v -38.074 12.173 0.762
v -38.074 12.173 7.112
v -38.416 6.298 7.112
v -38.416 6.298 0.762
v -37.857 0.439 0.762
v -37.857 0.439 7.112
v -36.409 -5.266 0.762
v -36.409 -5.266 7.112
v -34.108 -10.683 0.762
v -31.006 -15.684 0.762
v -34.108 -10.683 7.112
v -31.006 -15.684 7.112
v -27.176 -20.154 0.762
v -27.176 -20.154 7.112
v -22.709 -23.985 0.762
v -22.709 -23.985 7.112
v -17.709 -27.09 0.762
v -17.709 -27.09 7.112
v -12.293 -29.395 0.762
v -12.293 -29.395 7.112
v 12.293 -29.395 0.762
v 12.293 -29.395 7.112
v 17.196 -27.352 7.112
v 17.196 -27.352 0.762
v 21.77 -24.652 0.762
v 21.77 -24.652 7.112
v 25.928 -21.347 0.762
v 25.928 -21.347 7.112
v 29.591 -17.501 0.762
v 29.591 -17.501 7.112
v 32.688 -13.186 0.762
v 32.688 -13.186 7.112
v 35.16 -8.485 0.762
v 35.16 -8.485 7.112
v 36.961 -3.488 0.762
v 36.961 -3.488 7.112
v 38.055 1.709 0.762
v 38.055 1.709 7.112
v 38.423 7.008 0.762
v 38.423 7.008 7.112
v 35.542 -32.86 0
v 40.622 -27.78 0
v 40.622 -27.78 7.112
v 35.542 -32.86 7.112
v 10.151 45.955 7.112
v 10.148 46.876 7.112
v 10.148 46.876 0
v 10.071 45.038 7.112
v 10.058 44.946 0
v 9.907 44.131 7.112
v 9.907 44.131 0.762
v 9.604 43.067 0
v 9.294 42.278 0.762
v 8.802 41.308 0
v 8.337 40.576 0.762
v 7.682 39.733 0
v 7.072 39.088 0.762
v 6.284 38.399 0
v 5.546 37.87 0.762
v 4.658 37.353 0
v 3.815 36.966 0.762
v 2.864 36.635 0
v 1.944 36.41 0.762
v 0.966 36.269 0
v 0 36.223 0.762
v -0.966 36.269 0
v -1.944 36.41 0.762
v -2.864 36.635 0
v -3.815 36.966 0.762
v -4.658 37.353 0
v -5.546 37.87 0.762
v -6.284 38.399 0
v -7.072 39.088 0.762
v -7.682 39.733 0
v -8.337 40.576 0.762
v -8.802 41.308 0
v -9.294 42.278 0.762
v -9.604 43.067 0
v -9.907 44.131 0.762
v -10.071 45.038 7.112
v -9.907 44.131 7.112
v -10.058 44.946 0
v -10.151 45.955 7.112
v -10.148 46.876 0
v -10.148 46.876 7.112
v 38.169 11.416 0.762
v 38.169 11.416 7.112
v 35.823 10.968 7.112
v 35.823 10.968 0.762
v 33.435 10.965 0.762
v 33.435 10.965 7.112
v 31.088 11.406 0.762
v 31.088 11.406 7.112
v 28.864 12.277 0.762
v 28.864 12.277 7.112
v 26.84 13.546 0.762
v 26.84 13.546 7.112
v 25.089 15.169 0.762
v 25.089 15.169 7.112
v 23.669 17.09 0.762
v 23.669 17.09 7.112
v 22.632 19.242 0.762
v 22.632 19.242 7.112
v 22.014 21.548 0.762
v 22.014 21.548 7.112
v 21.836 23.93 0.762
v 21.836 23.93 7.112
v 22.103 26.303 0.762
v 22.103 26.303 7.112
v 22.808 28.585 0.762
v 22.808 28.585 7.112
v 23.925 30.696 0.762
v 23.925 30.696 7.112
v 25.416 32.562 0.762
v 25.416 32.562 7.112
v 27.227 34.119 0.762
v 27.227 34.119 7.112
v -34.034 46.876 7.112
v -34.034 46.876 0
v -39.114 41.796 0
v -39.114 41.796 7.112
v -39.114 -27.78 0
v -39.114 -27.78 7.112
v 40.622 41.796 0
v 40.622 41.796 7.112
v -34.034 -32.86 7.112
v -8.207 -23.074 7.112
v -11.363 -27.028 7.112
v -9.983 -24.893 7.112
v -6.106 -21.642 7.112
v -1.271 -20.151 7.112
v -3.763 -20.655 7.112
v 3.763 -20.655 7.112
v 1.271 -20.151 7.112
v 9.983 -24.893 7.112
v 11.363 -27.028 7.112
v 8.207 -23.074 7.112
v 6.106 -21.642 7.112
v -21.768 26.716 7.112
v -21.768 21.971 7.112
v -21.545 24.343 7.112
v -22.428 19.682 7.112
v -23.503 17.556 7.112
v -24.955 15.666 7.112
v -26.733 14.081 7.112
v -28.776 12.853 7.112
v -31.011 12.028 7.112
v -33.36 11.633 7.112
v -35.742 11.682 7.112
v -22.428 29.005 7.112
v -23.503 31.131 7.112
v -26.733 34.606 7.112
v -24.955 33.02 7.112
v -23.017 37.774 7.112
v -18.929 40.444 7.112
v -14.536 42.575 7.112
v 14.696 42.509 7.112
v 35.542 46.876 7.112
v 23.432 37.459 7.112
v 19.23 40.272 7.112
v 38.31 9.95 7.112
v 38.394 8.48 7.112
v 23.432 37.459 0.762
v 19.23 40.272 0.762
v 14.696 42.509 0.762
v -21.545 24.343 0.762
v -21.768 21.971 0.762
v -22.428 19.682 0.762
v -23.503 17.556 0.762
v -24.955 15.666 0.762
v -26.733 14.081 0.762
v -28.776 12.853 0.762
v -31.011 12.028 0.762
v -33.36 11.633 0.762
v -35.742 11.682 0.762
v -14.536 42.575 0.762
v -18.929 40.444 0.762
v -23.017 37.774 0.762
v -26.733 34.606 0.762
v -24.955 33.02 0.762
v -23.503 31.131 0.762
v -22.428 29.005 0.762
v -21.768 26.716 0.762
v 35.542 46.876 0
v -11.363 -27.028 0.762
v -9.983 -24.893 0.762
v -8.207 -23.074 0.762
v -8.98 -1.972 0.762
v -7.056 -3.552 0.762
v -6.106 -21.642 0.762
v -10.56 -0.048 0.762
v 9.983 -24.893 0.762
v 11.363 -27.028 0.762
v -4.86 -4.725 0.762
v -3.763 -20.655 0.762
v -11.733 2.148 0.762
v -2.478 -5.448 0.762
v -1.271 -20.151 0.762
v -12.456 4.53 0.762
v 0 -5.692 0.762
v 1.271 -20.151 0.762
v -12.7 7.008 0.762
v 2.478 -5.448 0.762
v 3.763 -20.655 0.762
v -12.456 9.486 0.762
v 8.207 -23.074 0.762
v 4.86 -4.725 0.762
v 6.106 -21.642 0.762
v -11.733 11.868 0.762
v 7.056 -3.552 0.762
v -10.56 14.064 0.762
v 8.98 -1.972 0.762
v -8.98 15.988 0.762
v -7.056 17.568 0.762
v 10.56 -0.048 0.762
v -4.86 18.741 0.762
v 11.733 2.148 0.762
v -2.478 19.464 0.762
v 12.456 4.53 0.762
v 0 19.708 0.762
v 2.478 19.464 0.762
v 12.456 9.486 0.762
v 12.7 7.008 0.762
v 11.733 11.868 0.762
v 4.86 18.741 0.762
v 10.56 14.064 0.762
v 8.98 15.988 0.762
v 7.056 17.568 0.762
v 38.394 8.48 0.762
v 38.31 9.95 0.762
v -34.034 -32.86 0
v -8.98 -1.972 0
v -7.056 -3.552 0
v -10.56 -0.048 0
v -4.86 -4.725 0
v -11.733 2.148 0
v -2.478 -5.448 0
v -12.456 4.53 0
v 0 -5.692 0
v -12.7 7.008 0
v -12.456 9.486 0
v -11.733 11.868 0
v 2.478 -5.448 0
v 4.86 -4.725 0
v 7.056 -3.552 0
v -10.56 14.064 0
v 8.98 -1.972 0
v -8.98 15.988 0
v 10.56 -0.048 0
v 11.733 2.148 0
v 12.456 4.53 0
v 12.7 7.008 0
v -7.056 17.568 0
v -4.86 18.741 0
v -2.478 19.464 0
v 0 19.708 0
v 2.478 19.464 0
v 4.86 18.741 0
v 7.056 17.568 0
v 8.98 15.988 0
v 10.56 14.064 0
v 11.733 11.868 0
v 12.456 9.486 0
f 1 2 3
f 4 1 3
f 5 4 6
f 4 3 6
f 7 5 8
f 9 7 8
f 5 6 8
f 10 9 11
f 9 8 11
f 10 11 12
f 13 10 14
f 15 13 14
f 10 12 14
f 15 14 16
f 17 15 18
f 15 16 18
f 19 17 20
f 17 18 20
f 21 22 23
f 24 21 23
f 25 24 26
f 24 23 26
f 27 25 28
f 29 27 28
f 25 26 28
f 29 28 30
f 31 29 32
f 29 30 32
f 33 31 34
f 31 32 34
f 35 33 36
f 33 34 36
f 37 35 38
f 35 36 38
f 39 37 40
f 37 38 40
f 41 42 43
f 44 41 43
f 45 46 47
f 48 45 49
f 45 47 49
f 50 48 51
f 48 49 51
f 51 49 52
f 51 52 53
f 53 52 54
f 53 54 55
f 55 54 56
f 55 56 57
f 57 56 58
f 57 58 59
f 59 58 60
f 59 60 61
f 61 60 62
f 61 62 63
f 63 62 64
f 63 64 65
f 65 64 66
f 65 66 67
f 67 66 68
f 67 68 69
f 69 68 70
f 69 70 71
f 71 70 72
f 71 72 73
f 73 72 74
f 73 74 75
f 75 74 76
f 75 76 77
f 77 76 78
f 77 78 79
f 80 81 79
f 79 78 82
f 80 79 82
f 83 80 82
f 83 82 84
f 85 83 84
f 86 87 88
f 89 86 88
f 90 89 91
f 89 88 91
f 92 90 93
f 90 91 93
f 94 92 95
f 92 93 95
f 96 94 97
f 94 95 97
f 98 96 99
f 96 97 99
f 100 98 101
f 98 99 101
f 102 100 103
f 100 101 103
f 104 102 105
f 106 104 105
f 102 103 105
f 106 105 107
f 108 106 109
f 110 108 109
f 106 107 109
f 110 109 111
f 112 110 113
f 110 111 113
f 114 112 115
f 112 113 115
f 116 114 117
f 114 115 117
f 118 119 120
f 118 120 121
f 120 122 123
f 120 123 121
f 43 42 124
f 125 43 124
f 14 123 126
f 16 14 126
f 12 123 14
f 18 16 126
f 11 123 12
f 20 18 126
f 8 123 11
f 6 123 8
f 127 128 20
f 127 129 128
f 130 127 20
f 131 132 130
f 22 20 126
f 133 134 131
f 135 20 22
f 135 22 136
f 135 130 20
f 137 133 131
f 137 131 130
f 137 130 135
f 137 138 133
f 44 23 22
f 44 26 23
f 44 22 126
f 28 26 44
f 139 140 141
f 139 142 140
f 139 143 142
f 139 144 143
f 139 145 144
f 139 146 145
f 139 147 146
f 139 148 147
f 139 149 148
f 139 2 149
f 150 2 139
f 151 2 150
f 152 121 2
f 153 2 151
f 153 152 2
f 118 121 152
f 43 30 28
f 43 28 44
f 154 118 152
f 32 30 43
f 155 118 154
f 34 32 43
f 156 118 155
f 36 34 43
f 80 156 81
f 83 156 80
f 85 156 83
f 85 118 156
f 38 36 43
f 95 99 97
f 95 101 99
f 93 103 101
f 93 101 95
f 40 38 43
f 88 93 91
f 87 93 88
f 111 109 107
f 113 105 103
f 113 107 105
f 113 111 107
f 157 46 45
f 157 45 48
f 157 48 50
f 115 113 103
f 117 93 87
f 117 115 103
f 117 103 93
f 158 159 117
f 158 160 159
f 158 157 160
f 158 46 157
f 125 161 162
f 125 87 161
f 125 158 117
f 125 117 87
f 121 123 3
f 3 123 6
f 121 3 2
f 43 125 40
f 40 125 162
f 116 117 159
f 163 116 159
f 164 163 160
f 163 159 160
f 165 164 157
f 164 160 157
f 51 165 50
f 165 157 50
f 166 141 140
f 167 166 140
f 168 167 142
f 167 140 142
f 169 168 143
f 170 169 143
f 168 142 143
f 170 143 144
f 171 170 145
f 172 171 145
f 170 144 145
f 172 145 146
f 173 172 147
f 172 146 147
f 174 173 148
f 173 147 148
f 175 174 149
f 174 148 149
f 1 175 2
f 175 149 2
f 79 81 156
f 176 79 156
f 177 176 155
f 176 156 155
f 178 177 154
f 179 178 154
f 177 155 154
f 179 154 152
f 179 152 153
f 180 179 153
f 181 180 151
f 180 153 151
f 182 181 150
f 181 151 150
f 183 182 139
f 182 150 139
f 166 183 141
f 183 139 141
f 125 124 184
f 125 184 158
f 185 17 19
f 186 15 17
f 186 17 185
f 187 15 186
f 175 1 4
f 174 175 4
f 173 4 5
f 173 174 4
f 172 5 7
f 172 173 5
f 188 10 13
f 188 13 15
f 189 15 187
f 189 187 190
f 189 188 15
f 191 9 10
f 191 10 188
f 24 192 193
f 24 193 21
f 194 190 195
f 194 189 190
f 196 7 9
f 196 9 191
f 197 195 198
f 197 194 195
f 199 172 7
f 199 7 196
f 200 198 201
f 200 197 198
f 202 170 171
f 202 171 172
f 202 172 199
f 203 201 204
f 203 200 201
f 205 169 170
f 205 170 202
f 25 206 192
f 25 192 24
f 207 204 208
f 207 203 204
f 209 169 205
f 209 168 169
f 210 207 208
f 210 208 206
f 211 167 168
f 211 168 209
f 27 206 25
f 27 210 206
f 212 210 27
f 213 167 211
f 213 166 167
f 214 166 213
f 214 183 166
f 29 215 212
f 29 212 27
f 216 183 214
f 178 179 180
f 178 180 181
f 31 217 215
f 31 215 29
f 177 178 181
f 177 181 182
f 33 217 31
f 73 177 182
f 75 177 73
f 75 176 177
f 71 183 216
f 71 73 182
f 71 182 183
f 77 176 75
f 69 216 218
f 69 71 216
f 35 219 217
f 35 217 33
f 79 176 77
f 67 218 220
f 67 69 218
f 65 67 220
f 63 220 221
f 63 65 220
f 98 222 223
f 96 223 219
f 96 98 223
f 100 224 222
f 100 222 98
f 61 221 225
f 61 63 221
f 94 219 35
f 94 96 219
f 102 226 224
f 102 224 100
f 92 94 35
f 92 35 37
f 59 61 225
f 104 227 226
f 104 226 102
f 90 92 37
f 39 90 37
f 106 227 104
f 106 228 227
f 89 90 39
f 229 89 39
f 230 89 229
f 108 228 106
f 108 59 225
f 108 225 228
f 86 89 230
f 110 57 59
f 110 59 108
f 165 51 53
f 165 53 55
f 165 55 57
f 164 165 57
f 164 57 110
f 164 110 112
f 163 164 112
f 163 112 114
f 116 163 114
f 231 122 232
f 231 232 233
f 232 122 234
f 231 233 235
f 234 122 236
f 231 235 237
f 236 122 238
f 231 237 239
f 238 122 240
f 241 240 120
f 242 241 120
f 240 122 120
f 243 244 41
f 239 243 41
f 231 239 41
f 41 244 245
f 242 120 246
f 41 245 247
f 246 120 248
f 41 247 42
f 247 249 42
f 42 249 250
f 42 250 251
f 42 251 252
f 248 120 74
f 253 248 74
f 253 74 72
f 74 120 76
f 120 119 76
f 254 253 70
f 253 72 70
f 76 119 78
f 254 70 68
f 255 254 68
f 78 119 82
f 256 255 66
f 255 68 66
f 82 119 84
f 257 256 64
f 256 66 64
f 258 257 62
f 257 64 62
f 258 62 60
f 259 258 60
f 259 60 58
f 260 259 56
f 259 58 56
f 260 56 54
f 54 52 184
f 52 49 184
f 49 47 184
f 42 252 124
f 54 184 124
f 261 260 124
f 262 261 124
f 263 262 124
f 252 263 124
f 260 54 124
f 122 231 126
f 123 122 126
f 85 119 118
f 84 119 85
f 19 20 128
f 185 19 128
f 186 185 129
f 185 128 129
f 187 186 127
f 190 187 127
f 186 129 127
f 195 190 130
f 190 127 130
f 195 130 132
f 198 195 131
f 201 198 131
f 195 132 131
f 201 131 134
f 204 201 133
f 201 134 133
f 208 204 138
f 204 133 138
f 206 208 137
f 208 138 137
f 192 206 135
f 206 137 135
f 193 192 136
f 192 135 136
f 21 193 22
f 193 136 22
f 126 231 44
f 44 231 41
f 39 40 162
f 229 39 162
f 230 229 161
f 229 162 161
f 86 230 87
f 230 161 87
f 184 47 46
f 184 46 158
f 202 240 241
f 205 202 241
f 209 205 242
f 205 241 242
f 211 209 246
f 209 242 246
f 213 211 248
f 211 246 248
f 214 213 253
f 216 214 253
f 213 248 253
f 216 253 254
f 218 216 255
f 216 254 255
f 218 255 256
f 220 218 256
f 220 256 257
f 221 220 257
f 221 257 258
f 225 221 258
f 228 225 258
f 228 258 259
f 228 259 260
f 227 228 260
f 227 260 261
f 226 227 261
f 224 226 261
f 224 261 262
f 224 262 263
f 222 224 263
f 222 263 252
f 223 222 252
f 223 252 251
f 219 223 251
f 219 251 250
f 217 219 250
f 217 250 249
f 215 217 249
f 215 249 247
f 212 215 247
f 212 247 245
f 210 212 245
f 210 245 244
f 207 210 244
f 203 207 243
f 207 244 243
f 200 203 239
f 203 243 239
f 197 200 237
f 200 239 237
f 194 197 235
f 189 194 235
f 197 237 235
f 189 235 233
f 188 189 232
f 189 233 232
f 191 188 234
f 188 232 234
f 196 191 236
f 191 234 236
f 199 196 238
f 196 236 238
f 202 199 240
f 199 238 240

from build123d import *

# Parameters (mm, degrees)
F0_W     = 79.736687
F0_H     = 79.736683
F1_DEPTH = 7.112
F3_DEPTH = 6.35
F4_SIZE  = 5.08
F6_D     = 25.4
F8_D     = 20.32
F5_R     = 12.951628
F9_DEPTH = 4.572


with BuildPart() as f1:
    # F0 (on Top) → F1 (new body)
    with BuildSketch(Plane.XY):
        with Locations((0.753854, 7.008081)):
            Rectangle(F0_W, F0_H)
    extrude(amount=F1_DEPTH)

    # F2 (on face) → F3 (cut)
    with BuildSketch(Plane.XY.offset(7.112)):
        with BuildLine():
            ThreePointArc((12.293341, -29.39476), (31.214057, -15.396734), (38.42256, 7.008081))
            ThreePointArc((38.42256, 7.008081), (38.359097, 9.215515), (38.168919, 11.415657))
            ThreePointArc((38.168919, 11.415657), (23.100575, 18.141586), (27.227051, 34.118611))
            ThreePointArc((27.227051, 34.118611), (0.347081, 45.429074), (-26.732835, 34.606064))
            ThreePointArc((-26.732835, 34.606064), (-22.915627, 30.093116), (-21.544947, 24.343419))
            ThreePointArc((-21.544947, 24.343419), (-26.733198, 14.080507), (-38.073768, 12.173477))
            ThreePointArc((-38.073768, 12.173477), (-32.65258, -13.242897), (-12.293341, -29.39476))
            ThreePointArc((-12.293341, -29.39476), (0, -20.087793), (12.293341, -29.39476))
        make_face()
    extrude(amount=-F3_DEPTH, mode=Mode.SUBTRACT)

    # F4
    f4_edges = [f1.edges().sort_by_distance(p)[0] for p in [
        (40.622197, 46.876423, 3.556),
        (-39.11449, 46.876423, 3.556),
        (40.622197, -32.86026, 3.556),
        (-39.11449, -32.86026, 3.556),
    ]]
    chamfer(f4_edges, length=F4_SIZE)

    # F6 (through all)
    with Locations(Plane.XY.offset(7.112)):
        with Locations((0, 7.008081)):
            Hole(F6_D / 2)

    # F8 (through all)
    with Locations(Plane.XY.offset(7.112)):
        with Locations((0, 46.382606)):
            Hole(F8_D / 2)

    # F5 (on face) + F0 (on Top) → F9 (cut)
    with BuildSketch(Plane.XY.offset(7.112)):
        with BuildLine():
            ThreePointArc((-12.293341, -29.39476), (0, -20.087793), (12.293341, -29.39476))
            ThreePointArc((12.293341, -29.39476), (31.214057, -15.396734), (38.42256, 7.008081))
            ThreePointArc((38.42256, 7.008081), (38.359097, 9.215515), (38.168919, 11.415657))
            ThreePointArc((38.168919, 11.415657), (23.100575, 18.141586), (27.227051, 34.118611))
            ThreePointArc((27.227051, 34.118611), (0.347081, 45.429074), (-26.732835, 34.606064))
            ThreePointArc((-26.732835, 34.606064), (-22.915627, 30.093116), (-21.544947, 24.343419))
            ThreePointArc((-21.544947, 24.343419), (-26.733198, 14.080507), (-38.073768, 12.173477))
            ThreePointArc((-38.073768, 12.173477), (-32.65258, -13.242897), (-12.293341, -29.39476))
        make_face()
        with Locations((0, 7.62)):
            Circle(F5_R, mode=Mode.SUBTRACT)
    with BuildSketch(Plane.XY):
        with Locations((0.753854, 7.008081)):
            Rectangle(F0_W, F0_H)
    extrude(amount=-F9_DEPTH, mode=Mode.SUBTRACT)


solid = f1.part
